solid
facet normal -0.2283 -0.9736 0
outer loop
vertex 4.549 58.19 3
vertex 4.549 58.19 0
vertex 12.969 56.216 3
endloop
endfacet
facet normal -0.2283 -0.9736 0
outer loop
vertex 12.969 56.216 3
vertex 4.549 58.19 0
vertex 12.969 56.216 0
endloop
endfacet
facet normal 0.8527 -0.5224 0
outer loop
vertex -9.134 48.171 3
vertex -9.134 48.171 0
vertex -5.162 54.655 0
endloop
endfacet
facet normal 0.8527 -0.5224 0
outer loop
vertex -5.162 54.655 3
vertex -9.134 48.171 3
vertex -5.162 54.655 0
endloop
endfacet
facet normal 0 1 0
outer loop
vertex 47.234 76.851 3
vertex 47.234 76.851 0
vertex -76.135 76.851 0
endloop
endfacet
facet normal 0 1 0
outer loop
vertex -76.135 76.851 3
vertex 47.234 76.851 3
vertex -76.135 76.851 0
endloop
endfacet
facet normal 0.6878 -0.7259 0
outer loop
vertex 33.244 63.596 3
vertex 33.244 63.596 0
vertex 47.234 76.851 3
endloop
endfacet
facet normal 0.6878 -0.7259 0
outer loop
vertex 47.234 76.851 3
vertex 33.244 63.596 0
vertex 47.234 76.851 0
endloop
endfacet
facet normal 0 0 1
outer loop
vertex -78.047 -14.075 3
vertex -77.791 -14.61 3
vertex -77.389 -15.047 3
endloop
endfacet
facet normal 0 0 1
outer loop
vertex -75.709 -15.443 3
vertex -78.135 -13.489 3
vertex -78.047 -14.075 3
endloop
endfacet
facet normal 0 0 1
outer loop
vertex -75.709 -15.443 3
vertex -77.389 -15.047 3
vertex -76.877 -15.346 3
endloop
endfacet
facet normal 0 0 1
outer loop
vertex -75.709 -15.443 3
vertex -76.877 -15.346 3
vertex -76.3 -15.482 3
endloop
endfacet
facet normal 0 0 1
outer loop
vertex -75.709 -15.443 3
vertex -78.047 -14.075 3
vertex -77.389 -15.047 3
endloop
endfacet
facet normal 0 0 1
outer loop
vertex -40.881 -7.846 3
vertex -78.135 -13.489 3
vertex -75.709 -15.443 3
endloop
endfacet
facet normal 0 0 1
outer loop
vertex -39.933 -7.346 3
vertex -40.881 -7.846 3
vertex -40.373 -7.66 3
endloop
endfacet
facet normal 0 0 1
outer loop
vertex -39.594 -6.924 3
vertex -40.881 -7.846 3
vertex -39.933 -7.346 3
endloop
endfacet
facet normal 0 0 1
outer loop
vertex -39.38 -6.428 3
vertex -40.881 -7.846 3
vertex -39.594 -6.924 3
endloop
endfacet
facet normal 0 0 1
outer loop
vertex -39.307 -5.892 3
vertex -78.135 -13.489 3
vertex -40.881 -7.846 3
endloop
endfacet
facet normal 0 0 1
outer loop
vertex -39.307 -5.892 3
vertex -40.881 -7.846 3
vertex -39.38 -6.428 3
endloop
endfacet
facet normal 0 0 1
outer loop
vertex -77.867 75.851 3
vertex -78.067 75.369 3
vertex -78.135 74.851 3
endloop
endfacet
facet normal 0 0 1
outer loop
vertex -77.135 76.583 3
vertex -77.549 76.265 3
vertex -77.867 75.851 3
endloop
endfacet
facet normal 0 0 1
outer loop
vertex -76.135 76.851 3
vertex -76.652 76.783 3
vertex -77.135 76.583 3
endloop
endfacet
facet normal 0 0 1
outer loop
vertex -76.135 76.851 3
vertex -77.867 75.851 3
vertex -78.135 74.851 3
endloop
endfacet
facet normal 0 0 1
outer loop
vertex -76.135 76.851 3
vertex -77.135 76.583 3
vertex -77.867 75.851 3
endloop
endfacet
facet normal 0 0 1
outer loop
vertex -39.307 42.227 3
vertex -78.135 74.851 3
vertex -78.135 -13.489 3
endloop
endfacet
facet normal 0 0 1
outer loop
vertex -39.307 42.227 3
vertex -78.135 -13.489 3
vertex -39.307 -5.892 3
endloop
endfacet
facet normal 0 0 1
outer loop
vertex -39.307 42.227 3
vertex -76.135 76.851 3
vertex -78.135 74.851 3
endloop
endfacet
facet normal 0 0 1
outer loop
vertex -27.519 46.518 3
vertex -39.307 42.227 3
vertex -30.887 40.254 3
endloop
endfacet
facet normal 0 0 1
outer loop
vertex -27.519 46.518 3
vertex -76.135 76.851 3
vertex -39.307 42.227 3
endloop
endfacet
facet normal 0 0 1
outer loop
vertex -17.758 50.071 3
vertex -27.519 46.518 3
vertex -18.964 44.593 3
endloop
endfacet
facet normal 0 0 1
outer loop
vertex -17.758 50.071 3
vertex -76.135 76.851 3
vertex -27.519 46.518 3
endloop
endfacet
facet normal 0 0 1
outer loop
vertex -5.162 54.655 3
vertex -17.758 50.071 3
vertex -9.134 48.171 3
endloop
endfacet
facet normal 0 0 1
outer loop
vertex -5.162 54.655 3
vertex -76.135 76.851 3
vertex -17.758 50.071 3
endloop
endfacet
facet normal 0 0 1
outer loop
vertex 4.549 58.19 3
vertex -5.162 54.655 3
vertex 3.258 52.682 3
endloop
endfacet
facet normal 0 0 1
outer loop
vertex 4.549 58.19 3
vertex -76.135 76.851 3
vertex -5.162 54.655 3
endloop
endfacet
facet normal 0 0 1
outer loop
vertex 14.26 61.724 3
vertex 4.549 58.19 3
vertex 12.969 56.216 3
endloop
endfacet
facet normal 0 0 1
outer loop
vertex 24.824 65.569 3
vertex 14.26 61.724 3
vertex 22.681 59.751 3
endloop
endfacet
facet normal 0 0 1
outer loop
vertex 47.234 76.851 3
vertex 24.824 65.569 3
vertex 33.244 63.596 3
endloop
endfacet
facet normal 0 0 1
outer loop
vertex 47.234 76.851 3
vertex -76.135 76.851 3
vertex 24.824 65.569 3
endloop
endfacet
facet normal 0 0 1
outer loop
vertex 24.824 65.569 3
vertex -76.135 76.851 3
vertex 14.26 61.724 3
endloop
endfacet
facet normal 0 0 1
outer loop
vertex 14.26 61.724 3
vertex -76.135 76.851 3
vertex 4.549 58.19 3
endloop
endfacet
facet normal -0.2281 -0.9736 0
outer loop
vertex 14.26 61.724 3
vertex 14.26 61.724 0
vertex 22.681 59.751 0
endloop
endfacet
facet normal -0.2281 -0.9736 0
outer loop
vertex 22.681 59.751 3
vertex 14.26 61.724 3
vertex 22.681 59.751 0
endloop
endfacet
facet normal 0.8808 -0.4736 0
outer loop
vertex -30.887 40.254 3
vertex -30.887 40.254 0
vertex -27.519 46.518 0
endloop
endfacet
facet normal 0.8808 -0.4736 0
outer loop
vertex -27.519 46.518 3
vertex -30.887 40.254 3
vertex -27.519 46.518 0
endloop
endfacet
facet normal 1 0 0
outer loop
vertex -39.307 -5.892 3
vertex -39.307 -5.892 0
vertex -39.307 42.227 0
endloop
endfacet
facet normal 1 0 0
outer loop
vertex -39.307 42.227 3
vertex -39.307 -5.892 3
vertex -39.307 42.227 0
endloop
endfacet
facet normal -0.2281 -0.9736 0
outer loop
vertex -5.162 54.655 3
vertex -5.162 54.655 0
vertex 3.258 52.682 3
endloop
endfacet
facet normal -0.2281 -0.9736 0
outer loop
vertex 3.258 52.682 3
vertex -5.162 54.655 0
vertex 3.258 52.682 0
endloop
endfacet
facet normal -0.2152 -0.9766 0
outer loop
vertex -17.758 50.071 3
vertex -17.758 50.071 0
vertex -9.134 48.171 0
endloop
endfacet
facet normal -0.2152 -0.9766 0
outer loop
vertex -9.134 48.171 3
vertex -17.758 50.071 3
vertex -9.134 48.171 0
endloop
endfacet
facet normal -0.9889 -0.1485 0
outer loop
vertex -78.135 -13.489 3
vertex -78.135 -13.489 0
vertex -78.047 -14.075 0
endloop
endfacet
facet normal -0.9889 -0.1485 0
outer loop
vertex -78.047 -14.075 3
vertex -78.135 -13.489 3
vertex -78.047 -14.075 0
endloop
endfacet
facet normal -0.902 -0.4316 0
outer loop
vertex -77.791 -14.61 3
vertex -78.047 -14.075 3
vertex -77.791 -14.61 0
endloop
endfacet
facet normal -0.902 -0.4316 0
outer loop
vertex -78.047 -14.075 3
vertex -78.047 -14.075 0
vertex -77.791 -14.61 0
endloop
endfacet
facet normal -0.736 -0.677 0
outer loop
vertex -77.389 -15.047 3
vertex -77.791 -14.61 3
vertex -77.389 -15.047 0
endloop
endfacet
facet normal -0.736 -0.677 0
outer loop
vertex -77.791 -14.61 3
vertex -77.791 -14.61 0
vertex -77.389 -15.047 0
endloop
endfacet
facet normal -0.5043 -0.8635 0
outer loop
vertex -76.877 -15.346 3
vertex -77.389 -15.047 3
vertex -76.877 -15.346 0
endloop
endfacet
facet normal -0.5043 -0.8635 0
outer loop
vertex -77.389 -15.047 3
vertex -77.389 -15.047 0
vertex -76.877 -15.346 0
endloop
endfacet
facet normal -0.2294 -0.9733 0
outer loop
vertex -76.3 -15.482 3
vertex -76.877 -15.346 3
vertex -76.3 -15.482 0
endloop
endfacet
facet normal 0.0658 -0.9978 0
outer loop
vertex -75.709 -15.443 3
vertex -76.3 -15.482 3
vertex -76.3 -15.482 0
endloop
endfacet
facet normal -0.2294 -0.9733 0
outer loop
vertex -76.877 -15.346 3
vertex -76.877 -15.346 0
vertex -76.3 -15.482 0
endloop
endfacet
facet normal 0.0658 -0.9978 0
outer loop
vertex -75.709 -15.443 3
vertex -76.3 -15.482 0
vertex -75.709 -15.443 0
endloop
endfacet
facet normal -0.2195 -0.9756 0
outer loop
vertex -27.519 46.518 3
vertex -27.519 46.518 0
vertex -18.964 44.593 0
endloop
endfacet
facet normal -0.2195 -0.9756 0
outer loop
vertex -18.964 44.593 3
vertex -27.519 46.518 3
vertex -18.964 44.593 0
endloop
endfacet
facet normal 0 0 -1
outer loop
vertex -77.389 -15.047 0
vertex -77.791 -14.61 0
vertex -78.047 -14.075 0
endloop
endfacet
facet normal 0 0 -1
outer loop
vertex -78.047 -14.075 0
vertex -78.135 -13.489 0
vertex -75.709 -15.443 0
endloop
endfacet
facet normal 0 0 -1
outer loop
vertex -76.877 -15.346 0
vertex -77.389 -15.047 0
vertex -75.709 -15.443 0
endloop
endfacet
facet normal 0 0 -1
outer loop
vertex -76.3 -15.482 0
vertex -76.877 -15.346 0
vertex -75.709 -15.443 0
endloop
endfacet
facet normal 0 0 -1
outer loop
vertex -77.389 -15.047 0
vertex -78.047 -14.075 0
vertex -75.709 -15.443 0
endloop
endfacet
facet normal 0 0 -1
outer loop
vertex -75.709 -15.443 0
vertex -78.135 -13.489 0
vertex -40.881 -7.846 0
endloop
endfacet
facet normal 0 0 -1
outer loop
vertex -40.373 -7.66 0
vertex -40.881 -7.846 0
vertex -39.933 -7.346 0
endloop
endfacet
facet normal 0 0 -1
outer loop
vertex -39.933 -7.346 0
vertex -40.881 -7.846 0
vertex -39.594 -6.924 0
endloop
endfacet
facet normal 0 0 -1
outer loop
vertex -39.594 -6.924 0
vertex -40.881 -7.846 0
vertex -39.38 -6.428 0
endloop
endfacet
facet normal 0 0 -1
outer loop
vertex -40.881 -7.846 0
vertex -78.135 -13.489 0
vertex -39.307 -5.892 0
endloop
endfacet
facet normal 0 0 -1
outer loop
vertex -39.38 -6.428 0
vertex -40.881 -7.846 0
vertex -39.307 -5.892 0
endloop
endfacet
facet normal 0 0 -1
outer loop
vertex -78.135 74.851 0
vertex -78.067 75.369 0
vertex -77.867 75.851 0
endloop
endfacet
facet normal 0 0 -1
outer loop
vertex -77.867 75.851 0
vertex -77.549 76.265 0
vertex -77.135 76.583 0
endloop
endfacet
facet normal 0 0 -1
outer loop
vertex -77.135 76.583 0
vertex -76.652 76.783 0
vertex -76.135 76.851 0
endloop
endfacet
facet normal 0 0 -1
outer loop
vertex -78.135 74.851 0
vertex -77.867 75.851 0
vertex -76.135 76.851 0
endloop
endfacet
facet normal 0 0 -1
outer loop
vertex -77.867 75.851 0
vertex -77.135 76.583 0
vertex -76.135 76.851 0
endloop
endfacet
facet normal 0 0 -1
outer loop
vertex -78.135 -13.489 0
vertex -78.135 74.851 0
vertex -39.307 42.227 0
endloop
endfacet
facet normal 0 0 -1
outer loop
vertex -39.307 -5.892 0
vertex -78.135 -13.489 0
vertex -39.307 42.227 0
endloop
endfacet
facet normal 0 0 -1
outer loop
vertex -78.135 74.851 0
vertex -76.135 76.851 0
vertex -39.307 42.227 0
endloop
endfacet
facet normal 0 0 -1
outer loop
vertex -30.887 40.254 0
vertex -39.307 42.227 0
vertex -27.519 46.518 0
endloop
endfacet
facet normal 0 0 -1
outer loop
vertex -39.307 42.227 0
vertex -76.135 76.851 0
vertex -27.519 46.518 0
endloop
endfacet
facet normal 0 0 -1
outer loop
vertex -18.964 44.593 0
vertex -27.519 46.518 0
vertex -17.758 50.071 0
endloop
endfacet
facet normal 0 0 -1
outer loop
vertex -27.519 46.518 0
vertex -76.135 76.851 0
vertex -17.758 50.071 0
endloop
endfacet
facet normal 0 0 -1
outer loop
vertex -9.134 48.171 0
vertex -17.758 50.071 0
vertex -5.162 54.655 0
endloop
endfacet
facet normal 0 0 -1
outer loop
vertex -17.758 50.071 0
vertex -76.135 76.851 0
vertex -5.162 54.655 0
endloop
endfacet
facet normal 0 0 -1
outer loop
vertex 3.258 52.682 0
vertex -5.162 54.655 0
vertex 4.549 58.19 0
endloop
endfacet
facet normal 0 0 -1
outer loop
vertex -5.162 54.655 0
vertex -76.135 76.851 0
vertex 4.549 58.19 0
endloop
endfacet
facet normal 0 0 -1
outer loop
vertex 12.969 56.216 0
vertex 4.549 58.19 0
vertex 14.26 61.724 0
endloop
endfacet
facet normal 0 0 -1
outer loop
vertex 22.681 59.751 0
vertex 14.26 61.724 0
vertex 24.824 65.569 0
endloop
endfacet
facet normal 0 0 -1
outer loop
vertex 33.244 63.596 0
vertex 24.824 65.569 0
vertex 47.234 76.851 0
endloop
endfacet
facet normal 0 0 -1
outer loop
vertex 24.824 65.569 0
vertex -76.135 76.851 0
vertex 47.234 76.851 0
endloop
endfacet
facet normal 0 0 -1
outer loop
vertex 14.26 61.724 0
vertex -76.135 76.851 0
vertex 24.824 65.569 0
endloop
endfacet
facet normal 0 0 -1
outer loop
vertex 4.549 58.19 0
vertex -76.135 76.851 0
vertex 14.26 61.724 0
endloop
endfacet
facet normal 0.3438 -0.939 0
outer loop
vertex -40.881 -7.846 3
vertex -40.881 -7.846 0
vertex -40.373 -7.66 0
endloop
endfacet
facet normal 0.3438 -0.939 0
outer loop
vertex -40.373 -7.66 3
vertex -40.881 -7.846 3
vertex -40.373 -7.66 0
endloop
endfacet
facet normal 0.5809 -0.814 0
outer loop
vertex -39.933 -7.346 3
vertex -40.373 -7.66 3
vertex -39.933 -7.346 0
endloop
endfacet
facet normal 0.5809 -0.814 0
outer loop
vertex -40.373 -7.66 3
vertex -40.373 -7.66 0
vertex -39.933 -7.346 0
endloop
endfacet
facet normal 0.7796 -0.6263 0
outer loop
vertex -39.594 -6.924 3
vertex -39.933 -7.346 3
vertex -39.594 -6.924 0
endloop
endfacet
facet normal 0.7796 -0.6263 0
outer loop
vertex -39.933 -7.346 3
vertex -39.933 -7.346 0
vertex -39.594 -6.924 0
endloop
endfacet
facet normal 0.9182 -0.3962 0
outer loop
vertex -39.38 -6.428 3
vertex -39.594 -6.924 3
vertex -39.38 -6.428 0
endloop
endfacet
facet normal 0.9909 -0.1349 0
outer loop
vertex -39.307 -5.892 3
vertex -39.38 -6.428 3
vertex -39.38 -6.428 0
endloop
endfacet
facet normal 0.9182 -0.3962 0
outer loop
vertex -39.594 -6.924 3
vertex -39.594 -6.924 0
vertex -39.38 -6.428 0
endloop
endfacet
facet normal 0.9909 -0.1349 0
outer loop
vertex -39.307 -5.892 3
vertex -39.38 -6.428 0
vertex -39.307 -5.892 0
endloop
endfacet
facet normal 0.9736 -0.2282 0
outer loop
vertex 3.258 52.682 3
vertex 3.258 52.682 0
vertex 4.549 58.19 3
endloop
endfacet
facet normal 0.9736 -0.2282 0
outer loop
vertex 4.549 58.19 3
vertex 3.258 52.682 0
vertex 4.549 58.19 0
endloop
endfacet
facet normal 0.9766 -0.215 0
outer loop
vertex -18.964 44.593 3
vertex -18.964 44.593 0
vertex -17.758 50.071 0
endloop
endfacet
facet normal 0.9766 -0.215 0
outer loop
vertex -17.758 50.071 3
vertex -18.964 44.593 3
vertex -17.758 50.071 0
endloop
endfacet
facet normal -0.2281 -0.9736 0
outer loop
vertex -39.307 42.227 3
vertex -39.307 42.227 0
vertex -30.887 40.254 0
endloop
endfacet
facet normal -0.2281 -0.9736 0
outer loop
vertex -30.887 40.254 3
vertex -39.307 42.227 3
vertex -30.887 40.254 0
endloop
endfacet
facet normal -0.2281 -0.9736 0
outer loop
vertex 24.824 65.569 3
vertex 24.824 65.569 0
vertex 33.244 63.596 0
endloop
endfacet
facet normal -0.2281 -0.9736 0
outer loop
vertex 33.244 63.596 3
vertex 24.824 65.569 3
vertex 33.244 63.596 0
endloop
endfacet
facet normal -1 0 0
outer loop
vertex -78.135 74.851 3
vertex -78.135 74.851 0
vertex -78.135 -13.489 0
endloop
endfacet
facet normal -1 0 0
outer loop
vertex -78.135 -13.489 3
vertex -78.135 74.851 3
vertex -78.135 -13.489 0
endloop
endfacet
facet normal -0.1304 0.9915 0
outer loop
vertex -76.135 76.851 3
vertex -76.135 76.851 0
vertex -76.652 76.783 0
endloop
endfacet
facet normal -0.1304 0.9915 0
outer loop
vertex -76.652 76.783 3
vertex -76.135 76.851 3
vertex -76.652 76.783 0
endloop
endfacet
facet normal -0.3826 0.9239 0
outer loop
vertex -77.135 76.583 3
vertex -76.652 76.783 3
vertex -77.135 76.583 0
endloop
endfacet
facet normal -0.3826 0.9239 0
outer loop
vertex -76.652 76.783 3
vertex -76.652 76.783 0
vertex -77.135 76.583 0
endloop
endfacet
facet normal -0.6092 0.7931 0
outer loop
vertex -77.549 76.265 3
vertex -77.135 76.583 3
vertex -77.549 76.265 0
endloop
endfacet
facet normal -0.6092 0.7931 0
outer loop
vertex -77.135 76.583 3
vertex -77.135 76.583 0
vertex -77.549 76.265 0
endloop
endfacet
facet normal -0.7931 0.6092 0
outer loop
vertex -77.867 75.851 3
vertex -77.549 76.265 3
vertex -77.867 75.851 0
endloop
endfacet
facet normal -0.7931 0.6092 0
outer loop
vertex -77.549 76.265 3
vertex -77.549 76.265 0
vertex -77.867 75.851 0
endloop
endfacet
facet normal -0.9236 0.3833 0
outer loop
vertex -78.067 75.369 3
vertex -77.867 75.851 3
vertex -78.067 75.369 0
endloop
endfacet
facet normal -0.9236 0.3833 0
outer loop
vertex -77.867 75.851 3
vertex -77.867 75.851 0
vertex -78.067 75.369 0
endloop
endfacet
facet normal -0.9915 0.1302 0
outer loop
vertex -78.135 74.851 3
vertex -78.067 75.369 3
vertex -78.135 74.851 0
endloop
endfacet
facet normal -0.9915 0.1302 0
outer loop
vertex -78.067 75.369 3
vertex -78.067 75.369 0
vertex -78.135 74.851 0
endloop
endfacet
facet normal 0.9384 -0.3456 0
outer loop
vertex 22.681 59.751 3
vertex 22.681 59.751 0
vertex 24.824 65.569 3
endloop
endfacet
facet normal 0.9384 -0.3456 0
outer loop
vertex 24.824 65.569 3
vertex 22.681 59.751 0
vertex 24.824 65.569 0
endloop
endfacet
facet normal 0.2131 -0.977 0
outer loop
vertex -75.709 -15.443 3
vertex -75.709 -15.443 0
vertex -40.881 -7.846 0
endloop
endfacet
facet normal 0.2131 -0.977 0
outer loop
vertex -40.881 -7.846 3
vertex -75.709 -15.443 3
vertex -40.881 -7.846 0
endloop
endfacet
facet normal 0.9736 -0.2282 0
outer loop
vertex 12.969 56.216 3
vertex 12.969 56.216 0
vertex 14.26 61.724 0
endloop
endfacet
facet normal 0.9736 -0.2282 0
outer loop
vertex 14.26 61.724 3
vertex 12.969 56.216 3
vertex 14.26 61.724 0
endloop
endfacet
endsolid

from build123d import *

# Parameters (mm, degrees)
F1_DEPTH = 3


with BuildPart() as f1:
    # F0 (on Top) → F1 (new body)
    with BuildSketch(Plane.XY):
        with BuildLine():
            Line((44.865233, 76.85111), (-76.134767, 76.85111))
            ThreePointArc((-76.134767, 76.85111), (-77.54898, 76.265324), (-78.134767, 74.85111))
            Line((-78.134767, 74.85111), (-78.134767, -13.489018))
            ThreePointArc((-78.134767, -13.489018), (-77.389263, -15.046657), (-75.708528, -15.443071))
            Line((-75.708528, -15.443071), (-40.880867, -7.8461))
            ThreePointArc((-40.880867, -7.8461), (-39.749467, -7.146545), (-39.307105, -5.892048))
            Line((-39.307105, -5.892048), (-39.307105, 36.074161))
            Line((-39.307105, 36.074161), (-39.307105, 42.227437))
            Line((-39.307105, 42.227437), (-30.88689, 40.253897))
            Line((-30.88689, 40.253897), (-27.519081, 46.517927))
            Line((-27.519081, 46.517927), (-18.964279, 44.593372))
            Line((-18.964279, 44.593372), (-17.757622, 50.070808))
            Line((-17.757622, 50.070808), (-9.134416, 48.17115))
            Line((-9.134416, 48.17115), (-5.162104, 54.655201))
            Line((-5.162104, 54.655201), (3.258111, 52.681661))
            Line((3.258111, 52.681661), (4.549114, 58.189796))
            Line((4.549114, 58.189796), (12.969329, 56.216255))
            Line((12.969329, 56.216255), (14.260333, 61.72439))
            Line((14.260333, 61.72439), (22.680548, 59.75085))
            Line((22.680548, 59.75085), (24.824019, 65.569257))
            Line((24.824019, 65.569257), (33.244234, 63.595717))
            Line((33.244234, 63.595717), (47.234441, 76.85111))
            Line((47.234441, 76.85111), (44.865233, 76.85111))
        make_face()
    extrude(amount=F1_DEPTH)


solid = f1.part
